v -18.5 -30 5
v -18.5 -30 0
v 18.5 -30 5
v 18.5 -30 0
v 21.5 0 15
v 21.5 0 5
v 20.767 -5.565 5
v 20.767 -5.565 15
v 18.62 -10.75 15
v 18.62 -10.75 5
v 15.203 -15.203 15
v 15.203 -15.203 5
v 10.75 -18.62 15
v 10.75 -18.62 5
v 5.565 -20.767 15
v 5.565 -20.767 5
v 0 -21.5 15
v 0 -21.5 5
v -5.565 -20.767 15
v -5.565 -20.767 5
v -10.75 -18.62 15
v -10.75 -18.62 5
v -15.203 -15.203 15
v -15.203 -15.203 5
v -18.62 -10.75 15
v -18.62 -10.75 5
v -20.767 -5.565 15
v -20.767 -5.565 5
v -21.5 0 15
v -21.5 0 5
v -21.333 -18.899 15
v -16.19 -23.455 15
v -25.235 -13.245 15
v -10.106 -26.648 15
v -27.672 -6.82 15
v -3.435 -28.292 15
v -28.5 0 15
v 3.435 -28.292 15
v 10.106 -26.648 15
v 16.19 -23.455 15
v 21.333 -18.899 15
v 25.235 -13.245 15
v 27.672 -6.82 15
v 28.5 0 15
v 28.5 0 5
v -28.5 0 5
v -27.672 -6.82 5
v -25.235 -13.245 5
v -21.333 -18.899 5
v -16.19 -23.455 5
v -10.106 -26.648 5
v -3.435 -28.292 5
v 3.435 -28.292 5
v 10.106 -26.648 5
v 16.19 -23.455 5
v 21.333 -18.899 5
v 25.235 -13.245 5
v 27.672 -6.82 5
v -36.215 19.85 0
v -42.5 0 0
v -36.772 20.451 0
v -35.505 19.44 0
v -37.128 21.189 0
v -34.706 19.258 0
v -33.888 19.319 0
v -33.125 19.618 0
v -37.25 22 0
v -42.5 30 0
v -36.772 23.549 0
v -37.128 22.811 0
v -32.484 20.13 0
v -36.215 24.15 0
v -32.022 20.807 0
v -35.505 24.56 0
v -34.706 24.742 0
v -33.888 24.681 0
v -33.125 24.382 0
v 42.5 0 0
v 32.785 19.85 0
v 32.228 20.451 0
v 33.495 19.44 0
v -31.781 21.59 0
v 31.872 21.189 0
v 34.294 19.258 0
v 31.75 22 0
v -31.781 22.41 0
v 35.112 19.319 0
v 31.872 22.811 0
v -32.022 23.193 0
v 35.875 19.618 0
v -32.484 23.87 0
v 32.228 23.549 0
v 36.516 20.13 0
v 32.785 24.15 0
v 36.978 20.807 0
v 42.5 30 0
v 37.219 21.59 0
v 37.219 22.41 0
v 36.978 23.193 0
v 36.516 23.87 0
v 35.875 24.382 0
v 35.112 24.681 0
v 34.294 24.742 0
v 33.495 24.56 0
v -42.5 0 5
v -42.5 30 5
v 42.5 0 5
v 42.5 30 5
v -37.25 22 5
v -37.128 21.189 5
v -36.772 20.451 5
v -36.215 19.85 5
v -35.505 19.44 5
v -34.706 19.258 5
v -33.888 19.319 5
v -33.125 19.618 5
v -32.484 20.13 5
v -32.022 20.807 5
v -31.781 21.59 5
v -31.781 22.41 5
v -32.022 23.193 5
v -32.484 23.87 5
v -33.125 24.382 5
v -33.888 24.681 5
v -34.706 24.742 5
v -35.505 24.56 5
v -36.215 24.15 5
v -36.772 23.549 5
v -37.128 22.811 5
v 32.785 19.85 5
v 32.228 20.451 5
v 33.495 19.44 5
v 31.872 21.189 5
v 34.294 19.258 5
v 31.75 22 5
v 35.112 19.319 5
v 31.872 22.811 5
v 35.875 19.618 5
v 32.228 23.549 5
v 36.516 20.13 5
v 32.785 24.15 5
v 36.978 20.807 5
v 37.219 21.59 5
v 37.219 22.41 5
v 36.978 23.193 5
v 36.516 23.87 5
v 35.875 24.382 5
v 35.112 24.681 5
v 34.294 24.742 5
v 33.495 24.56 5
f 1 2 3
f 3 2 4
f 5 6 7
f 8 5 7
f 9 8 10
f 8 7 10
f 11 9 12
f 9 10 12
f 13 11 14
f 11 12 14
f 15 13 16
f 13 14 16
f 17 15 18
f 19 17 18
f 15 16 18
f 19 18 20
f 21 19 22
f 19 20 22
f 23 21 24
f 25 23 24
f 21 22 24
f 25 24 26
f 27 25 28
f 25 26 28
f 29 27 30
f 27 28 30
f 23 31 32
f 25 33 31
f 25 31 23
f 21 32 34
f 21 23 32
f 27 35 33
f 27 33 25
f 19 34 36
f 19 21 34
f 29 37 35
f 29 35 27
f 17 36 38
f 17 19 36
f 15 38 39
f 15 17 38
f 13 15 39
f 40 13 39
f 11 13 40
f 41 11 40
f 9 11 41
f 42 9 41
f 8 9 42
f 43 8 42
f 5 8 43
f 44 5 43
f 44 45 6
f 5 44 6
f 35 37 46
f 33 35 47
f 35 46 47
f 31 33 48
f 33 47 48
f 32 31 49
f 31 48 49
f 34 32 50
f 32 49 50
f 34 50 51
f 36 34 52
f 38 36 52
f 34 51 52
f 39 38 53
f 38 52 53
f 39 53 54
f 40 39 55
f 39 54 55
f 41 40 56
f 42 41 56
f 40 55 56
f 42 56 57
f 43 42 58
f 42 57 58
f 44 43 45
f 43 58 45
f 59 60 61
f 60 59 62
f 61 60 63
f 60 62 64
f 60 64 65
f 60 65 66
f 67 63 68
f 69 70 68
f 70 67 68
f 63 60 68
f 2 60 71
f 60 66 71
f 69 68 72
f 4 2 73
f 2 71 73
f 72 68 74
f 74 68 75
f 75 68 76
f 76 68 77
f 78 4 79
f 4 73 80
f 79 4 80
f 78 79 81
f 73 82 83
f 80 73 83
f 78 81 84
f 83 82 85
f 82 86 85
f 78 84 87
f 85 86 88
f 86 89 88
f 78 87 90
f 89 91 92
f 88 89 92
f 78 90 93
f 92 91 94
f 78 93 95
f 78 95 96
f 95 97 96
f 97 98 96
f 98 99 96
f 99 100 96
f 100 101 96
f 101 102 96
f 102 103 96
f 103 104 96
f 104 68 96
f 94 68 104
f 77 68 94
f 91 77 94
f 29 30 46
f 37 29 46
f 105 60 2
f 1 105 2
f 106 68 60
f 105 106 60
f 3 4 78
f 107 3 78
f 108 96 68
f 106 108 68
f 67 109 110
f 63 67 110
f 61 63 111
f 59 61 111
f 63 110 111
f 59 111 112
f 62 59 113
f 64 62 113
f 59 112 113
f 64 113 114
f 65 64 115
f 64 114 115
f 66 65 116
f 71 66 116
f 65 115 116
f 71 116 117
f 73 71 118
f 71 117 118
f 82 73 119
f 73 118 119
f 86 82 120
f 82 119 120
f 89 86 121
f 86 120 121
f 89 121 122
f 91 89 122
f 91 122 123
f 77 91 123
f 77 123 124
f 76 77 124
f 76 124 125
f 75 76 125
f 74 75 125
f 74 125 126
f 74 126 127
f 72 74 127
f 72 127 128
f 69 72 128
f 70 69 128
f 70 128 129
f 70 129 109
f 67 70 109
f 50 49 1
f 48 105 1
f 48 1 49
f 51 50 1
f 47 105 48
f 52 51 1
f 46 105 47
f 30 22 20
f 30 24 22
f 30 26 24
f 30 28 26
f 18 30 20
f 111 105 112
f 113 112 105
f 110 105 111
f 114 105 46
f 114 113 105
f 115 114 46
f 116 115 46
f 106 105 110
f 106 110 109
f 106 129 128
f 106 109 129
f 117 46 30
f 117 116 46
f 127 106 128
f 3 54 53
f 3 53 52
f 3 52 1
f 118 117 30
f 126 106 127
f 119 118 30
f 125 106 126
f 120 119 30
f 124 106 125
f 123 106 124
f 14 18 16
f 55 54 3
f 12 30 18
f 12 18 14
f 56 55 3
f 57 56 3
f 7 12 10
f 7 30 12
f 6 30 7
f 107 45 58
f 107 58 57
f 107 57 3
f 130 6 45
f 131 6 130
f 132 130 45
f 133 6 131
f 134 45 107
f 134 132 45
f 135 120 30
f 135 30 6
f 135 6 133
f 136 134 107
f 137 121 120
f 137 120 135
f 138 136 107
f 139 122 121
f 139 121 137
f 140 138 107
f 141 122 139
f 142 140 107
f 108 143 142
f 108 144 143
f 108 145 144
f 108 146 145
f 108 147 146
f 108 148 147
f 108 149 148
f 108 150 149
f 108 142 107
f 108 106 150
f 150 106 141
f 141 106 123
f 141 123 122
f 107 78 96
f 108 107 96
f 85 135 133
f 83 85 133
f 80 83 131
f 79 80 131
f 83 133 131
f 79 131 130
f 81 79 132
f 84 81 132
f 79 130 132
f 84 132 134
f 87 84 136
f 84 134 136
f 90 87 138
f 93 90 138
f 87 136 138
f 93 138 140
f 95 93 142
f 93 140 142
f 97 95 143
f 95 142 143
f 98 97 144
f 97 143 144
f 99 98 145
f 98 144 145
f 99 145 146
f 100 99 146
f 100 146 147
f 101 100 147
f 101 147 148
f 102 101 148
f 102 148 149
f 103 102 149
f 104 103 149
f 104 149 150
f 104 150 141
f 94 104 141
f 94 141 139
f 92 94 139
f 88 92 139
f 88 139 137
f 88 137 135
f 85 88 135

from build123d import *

# Parameters (mm, degrees)
F1_DEPTH = 5
F3_DEPTH = 15
F4_D     = 5.5
F4_DEPTH = 13.5
F4_TIP   = 1.6523667023


with BuildPart() as f1:
    # F0 (on Top) → F1 (new body)
    with BuildSketch(Plane.XY):
        Polygon((42.5, 30), (-42.5, 30), (-42.5, 0), (-18.5, -30), (18.5, -30), (42.5, 0), align=None)
    extrude(amount=F1_DEPTH)

    # F2 (on Top) → F3 (join)
    with BuildSketch(Plane.XY):
        with BuildLine():
            ThreePointArc((21.5, 0), (0, -21.5), (-21.5, 0))
            Line((-21.5, 0), (-28.5, 0))
            ThreePointArc((-28.5, 0), (0, -28.5), (28.5, 0))
            Line((28.5, 0), (21.5, 0))
        make_face()
    extrude(amount=F3_DEPTH)

    # F4
    with Locations(Plane(origin=(0, 0, 0), x_dir=(1, 0, 0), z_dir=(0, 0, -1))):
        with Locations((-34.5, -22), (34.5, -22)):
            Hole(F4_D / 2, depth=F4_DEPTH)
            with Locations((0, 0, -(F4_DEPTH + F4_TIP / 2))):  # 118° drill point
                Cone(0, F4_D / 2, F4_TIP, mode=Mode.SUBTRACT)


solid = f1.part
